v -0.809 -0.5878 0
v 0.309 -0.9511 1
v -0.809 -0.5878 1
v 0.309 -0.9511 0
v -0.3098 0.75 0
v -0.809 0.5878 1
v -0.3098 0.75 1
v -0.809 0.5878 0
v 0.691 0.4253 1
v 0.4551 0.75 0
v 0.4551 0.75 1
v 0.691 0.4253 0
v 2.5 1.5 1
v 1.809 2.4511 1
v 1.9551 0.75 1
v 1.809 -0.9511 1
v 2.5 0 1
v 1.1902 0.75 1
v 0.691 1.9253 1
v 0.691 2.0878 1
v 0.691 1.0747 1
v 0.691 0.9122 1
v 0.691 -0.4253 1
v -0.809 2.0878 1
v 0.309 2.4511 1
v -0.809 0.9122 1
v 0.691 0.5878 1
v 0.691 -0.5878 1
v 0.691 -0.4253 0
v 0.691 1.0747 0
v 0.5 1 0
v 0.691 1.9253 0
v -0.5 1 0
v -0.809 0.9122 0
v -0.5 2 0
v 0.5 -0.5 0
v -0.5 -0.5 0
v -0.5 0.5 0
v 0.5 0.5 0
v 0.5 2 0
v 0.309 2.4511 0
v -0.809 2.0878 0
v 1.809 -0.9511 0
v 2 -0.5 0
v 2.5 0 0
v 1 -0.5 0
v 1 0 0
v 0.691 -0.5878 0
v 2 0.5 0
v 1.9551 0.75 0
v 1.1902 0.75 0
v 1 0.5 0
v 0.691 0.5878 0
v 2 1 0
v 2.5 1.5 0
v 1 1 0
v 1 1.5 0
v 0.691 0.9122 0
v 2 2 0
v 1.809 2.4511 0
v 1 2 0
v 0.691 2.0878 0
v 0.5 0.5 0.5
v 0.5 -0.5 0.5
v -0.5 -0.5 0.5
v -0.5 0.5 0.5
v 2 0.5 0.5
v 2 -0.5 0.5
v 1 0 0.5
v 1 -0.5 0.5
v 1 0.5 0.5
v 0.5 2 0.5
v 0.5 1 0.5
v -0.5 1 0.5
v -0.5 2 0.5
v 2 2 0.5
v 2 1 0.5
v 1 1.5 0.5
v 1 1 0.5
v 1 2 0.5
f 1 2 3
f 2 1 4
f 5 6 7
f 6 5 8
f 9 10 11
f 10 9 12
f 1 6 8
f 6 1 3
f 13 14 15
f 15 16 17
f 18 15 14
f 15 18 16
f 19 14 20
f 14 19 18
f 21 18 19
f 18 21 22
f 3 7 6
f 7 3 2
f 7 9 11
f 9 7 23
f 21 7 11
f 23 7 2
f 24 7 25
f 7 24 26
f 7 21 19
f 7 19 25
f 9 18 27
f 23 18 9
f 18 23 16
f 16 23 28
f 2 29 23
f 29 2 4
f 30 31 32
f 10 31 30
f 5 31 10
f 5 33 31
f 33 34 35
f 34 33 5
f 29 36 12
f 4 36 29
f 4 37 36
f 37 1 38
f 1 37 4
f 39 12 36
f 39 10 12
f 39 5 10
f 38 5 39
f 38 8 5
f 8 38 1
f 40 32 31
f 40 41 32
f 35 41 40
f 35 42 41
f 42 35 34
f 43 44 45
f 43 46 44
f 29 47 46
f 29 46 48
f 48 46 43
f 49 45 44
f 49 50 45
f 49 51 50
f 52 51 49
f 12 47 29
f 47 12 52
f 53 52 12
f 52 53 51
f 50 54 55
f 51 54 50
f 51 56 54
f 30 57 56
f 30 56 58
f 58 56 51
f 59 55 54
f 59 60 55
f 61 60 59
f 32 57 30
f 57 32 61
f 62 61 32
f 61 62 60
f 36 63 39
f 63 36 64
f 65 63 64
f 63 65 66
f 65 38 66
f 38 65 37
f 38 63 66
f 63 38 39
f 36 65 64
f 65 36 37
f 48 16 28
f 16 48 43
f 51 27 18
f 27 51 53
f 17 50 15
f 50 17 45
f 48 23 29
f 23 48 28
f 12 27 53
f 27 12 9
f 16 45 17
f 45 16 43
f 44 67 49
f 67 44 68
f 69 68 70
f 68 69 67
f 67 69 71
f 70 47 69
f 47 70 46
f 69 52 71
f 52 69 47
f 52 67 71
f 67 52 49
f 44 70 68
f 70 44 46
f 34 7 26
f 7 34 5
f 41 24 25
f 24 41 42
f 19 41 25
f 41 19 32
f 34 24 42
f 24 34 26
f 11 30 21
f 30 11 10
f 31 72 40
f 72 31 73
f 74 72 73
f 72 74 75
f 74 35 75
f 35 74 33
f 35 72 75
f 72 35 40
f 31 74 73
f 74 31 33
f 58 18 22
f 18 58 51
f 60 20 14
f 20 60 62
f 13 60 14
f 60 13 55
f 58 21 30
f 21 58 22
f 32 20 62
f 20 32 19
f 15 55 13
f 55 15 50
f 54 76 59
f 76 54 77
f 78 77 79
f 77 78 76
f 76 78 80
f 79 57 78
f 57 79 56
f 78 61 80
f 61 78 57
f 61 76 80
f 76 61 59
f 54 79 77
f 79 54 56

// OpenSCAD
// file: math.scad
///< Math scad module


///< Find the hypotenuse from two sides of a right triangle
function hyp_from_sides( a, b ) = sqrt( pow( a, 2 ) + pow( b, 2 ) );

///< Find equal sides from hypotenuse of a right triangle
function sides_from_hyp(h) = sqrt( pow( h, 2 ) / 2 );

///< Find A from hypotenuse and B
function a_from_hb( h, b ) = sqrt( pow( h, 2 ) - pow( b, 2 ) );

///< Test for math functions

A = 3;
B = 4;
echo("Given A=", A, "and B=", B );
H = hyp_from_sides( A, B );
echo("Hypotenuse=", H );
echo("Calc Correct = ", (H == 5) );

echo("Given H=", H, " which is a hypotenuse with equal sides" );
echo( "the sides=", sides_from_hyp( H ) );

echo("Given H=", H, "B=", 4 );
echo("A=", a_from_hb( H, 4 ) );
// main file
//< Tile again

use <math.scad>

module tile( row, col, cw, pack=false, rot=0, xpad=0, ypad=0 ){
     x_shift = pack ? 1 : 0;
     y_shift = a_from_hb( cw, cw/2 );
     ystep   = pack ? y_shift : cw;
     for ( i = [0:row-1] ){
	  for( j = [0:col-1] ){
	       translate( [ j * (cw + xpad) + ( x_shift * (i%2) * cw/2), i * ( ystep + ypad), 0 ] )
		    rotate([0,0,rot])
		    children();
	  }
     }
}

width = 1;
tile(2,2,width+0.5) {
     difference() {
	  cylinder(width);
	  cube(width,true);
     }
}
